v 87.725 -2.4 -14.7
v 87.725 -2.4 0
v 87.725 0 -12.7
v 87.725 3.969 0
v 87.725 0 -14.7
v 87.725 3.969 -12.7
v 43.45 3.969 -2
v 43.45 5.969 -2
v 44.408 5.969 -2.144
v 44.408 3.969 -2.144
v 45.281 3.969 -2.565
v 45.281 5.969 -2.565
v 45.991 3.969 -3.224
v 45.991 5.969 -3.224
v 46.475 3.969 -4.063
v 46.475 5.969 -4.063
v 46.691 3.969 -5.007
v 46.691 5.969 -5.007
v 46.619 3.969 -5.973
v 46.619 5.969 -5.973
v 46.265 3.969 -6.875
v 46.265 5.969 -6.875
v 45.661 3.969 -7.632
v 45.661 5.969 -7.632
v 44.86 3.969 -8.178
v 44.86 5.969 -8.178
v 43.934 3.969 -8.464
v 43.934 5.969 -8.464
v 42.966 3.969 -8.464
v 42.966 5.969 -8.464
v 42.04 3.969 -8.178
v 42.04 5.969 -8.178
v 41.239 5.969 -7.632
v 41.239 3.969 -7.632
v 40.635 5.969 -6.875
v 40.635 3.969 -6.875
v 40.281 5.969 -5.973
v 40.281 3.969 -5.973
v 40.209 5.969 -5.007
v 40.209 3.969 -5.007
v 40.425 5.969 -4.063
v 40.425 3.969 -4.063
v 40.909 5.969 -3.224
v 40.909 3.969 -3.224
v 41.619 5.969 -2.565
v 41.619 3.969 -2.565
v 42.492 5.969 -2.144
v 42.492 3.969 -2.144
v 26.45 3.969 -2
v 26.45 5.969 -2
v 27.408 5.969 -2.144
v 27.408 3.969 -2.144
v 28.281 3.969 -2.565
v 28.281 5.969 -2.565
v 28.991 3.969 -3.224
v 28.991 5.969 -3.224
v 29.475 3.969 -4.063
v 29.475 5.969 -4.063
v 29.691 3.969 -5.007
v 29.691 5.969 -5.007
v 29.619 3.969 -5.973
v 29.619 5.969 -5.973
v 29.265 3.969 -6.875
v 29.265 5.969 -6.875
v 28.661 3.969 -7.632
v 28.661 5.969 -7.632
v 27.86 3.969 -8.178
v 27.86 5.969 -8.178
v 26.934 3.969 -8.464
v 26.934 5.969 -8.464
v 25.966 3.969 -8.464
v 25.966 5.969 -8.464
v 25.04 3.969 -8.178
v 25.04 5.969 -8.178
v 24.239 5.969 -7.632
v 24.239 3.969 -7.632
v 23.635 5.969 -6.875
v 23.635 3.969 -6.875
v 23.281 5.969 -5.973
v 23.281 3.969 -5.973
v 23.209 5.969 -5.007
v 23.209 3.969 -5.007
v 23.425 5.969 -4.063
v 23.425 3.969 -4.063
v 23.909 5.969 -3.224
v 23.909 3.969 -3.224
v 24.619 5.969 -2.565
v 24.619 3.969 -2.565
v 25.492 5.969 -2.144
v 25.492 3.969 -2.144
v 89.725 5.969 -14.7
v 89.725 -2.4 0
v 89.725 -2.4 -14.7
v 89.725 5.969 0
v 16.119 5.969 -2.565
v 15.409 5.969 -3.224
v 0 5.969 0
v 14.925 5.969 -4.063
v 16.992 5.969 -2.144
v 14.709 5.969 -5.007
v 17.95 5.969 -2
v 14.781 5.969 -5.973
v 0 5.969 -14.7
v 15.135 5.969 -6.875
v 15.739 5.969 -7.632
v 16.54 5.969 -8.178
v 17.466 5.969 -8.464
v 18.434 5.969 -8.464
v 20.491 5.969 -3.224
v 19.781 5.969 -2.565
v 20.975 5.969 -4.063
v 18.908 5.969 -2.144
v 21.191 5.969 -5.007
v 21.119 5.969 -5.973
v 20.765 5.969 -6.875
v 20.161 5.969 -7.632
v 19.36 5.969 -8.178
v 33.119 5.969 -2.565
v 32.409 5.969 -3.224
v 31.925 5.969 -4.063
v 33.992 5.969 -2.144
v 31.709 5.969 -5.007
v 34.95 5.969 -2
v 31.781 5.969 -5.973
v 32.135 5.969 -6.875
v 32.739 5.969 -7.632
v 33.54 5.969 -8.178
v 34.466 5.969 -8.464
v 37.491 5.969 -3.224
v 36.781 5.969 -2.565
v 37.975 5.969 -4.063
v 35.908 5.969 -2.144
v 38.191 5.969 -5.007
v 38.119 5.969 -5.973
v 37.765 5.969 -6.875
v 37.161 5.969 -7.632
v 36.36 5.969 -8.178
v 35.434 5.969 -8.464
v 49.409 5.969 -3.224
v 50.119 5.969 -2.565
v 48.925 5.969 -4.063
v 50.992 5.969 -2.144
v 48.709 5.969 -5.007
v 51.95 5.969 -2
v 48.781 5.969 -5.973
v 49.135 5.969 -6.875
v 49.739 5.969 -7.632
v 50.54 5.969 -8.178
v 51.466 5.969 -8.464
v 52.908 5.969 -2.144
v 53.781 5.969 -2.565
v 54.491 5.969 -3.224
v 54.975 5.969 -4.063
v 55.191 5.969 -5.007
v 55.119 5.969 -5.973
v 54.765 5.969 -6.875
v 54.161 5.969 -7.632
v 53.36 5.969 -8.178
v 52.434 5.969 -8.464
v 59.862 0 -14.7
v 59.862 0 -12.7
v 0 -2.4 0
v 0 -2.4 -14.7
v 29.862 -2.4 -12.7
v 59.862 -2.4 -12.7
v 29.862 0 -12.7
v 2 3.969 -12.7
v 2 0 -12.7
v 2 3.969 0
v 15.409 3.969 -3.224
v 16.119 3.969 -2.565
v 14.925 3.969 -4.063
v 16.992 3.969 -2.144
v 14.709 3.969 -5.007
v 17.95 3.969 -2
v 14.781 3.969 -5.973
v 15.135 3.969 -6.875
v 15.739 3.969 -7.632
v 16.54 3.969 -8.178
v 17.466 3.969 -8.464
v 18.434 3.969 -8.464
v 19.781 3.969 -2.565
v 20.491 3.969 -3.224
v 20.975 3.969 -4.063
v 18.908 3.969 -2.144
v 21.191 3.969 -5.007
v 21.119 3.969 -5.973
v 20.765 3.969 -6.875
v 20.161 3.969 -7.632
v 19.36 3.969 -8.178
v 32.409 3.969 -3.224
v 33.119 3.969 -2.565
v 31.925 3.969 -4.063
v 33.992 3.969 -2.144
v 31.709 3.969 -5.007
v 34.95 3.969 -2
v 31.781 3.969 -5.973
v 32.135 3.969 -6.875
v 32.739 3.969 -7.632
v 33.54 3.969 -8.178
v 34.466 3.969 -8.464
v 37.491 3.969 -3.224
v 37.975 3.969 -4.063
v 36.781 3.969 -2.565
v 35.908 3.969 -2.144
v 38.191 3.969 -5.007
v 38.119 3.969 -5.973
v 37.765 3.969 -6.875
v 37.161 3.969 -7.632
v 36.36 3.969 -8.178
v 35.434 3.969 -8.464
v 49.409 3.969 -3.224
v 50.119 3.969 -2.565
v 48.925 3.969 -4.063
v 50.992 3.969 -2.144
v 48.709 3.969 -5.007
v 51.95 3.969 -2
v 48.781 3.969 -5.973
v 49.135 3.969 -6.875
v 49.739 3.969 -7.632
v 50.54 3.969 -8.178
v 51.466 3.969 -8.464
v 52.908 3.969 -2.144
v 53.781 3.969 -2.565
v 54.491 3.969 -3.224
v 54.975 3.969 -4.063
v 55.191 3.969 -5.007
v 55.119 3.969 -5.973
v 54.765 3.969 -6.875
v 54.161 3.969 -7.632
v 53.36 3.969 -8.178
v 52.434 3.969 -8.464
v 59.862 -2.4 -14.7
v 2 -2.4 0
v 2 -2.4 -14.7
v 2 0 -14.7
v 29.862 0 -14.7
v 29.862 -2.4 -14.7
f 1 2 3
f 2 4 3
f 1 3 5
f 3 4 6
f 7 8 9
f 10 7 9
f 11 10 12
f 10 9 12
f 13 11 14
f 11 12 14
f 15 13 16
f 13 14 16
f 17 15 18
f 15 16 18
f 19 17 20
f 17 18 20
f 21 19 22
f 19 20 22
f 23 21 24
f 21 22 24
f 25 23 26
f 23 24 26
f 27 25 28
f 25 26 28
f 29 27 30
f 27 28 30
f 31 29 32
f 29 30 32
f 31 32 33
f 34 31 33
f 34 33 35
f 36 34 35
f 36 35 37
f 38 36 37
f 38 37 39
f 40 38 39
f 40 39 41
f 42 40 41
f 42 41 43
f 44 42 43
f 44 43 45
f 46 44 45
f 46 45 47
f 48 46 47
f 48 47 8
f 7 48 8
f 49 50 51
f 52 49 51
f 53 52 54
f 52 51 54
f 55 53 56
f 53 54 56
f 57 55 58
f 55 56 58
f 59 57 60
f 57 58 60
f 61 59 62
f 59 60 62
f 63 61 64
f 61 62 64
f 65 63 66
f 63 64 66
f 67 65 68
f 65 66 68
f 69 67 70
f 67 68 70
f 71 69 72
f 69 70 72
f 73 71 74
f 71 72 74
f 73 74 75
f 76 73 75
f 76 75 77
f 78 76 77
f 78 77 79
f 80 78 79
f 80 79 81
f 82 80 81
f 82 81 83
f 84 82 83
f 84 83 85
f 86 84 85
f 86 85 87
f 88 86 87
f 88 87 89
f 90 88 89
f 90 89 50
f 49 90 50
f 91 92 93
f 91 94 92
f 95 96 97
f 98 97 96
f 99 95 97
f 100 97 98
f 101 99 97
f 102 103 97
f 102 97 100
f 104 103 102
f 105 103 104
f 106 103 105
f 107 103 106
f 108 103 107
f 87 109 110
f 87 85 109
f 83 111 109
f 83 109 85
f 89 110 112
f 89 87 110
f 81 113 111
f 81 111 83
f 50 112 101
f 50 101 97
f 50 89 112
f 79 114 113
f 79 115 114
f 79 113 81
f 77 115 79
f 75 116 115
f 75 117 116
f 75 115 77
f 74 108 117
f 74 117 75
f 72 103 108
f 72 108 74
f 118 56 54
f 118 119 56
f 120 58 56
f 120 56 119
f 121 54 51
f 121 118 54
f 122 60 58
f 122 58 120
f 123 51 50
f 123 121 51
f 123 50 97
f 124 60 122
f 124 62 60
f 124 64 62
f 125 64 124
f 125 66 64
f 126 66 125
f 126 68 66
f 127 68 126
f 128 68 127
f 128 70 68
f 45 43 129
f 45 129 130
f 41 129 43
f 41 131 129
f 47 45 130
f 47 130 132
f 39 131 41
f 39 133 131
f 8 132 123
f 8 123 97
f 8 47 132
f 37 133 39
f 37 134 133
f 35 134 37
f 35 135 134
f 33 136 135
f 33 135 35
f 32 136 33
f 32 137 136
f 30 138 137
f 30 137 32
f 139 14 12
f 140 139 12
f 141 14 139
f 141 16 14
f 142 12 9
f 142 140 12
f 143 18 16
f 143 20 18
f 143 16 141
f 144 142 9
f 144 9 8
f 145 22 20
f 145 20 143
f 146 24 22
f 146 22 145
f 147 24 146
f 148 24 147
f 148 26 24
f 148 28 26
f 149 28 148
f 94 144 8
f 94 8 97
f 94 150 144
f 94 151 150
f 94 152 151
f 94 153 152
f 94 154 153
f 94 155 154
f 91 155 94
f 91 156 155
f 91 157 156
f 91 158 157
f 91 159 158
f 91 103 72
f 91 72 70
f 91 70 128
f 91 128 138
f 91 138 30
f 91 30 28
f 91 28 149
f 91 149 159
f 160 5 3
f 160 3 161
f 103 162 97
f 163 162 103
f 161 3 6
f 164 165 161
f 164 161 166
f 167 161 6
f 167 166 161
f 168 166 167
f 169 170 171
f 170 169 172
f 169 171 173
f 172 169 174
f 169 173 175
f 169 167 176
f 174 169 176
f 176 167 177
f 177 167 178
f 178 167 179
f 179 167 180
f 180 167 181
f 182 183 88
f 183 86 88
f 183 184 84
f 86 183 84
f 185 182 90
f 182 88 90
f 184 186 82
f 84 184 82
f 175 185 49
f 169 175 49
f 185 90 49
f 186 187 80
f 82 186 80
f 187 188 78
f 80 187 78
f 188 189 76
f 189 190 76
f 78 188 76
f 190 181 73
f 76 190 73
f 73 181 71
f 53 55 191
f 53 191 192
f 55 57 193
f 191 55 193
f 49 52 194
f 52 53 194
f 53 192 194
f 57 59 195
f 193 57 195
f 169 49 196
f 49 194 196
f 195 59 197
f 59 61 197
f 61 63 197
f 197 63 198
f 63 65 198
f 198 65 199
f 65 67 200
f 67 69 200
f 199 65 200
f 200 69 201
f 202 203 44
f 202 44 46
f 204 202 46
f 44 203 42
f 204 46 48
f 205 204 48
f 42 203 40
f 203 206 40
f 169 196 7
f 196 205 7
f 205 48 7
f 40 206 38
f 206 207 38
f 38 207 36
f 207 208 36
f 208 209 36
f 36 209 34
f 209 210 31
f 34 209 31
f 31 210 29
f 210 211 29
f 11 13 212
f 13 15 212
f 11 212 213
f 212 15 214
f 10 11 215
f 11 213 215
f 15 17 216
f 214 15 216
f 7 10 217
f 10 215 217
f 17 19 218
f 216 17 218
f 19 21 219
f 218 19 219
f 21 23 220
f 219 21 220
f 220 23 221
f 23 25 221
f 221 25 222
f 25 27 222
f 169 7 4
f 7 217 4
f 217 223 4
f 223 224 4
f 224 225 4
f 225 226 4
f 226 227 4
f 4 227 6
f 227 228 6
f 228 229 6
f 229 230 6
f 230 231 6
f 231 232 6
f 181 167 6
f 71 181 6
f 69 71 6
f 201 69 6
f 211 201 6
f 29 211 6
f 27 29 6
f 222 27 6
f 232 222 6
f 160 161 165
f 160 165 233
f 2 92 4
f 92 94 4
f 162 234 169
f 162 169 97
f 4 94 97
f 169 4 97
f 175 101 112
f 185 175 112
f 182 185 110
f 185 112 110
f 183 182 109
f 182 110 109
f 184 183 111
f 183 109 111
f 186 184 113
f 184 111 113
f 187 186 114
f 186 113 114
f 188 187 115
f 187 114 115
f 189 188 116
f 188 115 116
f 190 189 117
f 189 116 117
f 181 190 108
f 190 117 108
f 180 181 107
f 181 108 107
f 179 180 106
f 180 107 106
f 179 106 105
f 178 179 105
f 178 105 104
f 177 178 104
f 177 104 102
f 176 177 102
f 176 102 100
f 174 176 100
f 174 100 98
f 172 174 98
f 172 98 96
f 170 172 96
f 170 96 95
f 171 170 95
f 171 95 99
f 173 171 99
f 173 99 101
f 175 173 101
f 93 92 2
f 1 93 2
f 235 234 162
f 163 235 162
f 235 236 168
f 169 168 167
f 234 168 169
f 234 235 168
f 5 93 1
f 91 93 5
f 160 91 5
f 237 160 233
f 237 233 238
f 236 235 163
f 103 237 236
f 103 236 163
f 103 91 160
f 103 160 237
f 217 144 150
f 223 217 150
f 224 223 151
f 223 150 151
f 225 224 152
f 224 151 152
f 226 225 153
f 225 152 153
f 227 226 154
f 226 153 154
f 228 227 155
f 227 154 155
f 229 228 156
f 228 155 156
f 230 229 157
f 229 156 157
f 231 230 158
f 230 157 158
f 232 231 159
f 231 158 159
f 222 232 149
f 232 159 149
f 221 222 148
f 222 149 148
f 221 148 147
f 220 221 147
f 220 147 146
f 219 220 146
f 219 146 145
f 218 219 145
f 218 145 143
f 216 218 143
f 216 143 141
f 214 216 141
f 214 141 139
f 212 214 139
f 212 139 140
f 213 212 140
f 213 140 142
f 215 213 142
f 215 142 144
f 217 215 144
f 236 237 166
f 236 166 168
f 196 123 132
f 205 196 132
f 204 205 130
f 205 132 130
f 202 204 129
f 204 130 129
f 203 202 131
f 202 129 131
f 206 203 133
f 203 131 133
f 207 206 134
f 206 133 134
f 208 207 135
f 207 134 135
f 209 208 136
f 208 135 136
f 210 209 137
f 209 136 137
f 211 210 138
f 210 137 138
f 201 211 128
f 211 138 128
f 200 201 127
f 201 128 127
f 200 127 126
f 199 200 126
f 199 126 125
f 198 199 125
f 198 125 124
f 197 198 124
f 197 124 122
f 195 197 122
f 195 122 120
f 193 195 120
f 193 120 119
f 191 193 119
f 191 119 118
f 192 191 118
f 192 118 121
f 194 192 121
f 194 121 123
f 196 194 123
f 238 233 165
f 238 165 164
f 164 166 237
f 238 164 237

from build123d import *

# Parameters (mm, degrees)
BOSS_EXTRUDE1_DEPTH = 3.96875
SKETCH2_W           = 89.725
SKETCH2_H           = 14.7
BOSS_EXTRUDE2_DEPTH = 2
SKETCH3_R           = 3.25
CUT_EXTRUDE1_DEPTH  = 92.116911721
SKETCH4_W           = 2
SKETCH4_H           = 14.7
SKETCH4_W_2         = 30
SKETCH4_H_2         = 2
BOSS_EXTRUDE3_DEPTH = 2.4


with BuildPart() as part:
    # Sketch1 → Boss-Extrude1 (new body)
    with BuildSketch(Plane(origin=(0, 0, 0), x_dir=(1, 0, 0), z_dir=(0, 1, 0))):
        Polygon((0, 0), (0, 14.7), (89.725, 14.7), (89.725, 0), (87.725, 0), (87.725, 12.7), (2, 12.7), (2, 0), align=None)
    extrude(amount=BOSS_EXTRUDE1_DEPTH)

    # Sketch2 → Boss-Extrude2 (add)
    with BuildSketch(Plane(origin=(0, 3.96875, 0), x_dir=(1, 0, 0), z_dir=(0, 1, 0))):
        with Locations((44.8625, 7.35)):
            Rectangle(SKETCH2_W, SKETCH2_H)
    extrude(amount=BOSS_EXTRUDE2_DEPTH)

    # Sketch3 → Cut-Extrude1 (cut, through all)
    with BuildSketch(Plane(origin=(0, 5.96875, 0), x_dir=(1, 0, 0), z_dir=(0, 1, 0))):
        with Locations(Location((17.95, 5.25, 0), (0, 0, 270))):
            Circle(SKETCH3_R)
        with Locations(Location((26.45, 5.25, 0), (0, 0, 270))):
            Circle(SKETCH3_R)
        with Locations(Location((34.95, 5.25, 0), (0, 0, 270))):
            Circle(SKETCH3_R)
        with Locations(Location((43.45, 5.25, 0), (0, 0, 270))):
            Circle(SKETCH3_R)
        with Locations(Location((51.95, 5.25, 0), (0, 0, 270))):
            Circle(SKETCH3_R)
    extrude(amount=-CUT_EXTRUDE1_DEPTH, mode=Mode.SUBTRACT)

    # Sketch4 → Boss-Extrude3 (add)
    with BuildSketch(Plane(origin=(0, 0, 0), x_dir=(-1, 0, 0), z_dir=(0, -1, 0))):
        with Locations((-88.725, 7.35)):
            Rectangle(SKETCH4_W, SKETCH4_H)
        with Locations((-1, 7.35)):
            Rectangle(SKETCH4_W, SKETCH4_H)
        with Locations((-44.8625, 13.7)):
            Rectangle(SKETCH4_W_2, SKETCH4_H_2)
    extrude(amount=BOSS_EXTRUDE3_DEPTH)


solid = part.part
